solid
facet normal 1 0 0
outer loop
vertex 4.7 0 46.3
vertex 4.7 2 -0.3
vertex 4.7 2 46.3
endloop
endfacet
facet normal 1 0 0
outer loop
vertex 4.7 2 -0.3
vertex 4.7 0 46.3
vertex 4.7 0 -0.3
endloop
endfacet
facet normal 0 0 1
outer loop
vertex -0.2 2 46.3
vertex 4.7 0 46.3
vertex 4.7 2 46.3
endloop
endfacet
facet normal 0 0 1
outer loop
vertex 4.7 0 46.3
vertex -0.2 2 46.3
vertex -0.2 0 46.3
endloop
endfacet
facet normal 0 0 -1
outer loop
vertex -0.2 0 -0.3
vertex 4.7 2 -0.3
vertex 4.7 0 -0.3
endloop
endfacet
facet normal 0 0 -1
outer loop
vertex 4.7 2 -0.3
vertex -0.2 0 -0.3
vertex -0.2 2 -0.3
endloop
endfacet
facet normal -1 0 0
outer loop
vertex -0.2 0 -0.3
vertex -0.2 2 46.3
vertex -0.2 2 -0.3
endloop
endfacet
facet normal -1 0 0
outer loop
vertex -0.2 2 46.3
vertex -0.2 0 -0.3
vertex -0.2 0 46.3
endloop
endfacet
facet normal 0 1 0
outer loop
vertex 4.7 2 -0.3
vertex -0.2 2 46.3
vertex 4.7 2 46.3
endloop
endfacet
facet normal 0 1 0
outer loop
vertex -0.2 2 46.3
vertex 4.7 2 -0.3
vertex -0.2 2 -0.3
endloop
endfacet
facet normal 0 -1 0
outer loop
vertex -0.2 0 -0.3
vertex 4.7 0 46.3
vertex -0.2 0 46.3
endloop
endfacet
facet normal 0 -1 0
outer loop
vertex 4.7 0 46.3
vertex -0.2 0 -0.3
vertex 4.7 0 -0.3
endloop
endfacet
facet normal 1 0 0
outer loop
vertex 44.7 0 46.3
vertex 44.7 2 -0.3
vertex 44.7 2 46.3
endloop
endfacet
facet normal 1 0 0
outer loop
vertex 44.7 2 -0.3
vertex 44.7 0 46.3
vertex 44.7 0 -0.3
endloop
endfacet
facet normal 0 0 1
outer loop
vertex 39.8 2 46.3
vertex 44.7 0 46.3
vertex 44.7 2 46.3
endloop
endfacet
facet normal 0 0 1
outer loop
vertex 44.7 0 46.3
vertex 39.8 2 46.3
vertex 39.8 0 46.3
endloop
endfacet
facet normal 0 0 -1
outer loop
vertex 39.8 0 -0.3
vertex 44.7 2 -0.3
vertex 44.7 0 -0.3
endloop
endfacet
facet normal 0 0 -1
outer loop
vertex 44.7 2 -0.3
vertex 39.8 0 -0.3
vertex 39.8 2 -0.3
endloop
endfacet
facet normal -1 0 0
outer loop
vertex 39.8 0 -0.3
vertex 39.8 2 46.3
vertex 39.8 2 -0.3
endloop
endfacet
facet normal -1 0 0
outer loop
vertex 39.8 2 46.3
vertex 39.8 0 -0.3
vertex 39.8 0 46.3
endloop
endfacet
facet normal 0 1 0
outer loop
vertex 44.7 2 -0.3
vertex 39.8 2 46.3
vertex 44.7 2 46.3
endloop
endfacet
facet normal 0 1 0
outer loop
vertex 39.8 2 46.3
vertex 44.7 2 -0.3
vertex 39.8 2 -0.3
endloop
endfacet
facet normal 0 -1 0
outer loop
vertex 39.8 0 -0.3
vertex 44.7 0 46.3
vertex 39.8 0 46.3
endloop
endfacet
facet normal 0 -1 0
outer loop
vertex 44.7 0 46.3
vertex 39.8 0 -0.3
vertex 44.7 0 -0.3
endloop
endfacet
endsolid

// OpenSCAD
skadis_hook_width = 4.5;
skadis_hook_height = 46;
skadis_hole_spacing_width = 40; // middle to middle
cutout_tolerance_w = 0.4;
cutout_tolerance_h = 0.6;


module skadis_hook_cutout(center=false, hook_count=2) {
    
    if(center) {
        translate([-(skadis_hole_spacing_width + skadis_hook_width) / 2, 0, - skadis_hook_height / 2])
        object(hook_count);
    } else {
        object();
    }
    

}

module object(hook_count=2) {
    union() {

        // Cutout for the hook 1
        color("red")
        translate([- cutout_tolerance_w / 2, 0, - cutout_tolerance_h / 2])
        cube([skadis_hook_width + cutout_tolerance_w, 2, skadis_hook_height + cutout_tolerance_h]);

        // Cutout for the hook 2
        color("red")
        translate([- cutout_tolerance_w / 2 + skadis_hole_spacing_width, 0, - cutout_tolerance_h / 2])
        cube([skadis_hook_width + cutout_tolerance_w, 2, skadis_hook_height + cutout_tolerance_h]);

    }
}

skadis_hook_cutout(center = false);
